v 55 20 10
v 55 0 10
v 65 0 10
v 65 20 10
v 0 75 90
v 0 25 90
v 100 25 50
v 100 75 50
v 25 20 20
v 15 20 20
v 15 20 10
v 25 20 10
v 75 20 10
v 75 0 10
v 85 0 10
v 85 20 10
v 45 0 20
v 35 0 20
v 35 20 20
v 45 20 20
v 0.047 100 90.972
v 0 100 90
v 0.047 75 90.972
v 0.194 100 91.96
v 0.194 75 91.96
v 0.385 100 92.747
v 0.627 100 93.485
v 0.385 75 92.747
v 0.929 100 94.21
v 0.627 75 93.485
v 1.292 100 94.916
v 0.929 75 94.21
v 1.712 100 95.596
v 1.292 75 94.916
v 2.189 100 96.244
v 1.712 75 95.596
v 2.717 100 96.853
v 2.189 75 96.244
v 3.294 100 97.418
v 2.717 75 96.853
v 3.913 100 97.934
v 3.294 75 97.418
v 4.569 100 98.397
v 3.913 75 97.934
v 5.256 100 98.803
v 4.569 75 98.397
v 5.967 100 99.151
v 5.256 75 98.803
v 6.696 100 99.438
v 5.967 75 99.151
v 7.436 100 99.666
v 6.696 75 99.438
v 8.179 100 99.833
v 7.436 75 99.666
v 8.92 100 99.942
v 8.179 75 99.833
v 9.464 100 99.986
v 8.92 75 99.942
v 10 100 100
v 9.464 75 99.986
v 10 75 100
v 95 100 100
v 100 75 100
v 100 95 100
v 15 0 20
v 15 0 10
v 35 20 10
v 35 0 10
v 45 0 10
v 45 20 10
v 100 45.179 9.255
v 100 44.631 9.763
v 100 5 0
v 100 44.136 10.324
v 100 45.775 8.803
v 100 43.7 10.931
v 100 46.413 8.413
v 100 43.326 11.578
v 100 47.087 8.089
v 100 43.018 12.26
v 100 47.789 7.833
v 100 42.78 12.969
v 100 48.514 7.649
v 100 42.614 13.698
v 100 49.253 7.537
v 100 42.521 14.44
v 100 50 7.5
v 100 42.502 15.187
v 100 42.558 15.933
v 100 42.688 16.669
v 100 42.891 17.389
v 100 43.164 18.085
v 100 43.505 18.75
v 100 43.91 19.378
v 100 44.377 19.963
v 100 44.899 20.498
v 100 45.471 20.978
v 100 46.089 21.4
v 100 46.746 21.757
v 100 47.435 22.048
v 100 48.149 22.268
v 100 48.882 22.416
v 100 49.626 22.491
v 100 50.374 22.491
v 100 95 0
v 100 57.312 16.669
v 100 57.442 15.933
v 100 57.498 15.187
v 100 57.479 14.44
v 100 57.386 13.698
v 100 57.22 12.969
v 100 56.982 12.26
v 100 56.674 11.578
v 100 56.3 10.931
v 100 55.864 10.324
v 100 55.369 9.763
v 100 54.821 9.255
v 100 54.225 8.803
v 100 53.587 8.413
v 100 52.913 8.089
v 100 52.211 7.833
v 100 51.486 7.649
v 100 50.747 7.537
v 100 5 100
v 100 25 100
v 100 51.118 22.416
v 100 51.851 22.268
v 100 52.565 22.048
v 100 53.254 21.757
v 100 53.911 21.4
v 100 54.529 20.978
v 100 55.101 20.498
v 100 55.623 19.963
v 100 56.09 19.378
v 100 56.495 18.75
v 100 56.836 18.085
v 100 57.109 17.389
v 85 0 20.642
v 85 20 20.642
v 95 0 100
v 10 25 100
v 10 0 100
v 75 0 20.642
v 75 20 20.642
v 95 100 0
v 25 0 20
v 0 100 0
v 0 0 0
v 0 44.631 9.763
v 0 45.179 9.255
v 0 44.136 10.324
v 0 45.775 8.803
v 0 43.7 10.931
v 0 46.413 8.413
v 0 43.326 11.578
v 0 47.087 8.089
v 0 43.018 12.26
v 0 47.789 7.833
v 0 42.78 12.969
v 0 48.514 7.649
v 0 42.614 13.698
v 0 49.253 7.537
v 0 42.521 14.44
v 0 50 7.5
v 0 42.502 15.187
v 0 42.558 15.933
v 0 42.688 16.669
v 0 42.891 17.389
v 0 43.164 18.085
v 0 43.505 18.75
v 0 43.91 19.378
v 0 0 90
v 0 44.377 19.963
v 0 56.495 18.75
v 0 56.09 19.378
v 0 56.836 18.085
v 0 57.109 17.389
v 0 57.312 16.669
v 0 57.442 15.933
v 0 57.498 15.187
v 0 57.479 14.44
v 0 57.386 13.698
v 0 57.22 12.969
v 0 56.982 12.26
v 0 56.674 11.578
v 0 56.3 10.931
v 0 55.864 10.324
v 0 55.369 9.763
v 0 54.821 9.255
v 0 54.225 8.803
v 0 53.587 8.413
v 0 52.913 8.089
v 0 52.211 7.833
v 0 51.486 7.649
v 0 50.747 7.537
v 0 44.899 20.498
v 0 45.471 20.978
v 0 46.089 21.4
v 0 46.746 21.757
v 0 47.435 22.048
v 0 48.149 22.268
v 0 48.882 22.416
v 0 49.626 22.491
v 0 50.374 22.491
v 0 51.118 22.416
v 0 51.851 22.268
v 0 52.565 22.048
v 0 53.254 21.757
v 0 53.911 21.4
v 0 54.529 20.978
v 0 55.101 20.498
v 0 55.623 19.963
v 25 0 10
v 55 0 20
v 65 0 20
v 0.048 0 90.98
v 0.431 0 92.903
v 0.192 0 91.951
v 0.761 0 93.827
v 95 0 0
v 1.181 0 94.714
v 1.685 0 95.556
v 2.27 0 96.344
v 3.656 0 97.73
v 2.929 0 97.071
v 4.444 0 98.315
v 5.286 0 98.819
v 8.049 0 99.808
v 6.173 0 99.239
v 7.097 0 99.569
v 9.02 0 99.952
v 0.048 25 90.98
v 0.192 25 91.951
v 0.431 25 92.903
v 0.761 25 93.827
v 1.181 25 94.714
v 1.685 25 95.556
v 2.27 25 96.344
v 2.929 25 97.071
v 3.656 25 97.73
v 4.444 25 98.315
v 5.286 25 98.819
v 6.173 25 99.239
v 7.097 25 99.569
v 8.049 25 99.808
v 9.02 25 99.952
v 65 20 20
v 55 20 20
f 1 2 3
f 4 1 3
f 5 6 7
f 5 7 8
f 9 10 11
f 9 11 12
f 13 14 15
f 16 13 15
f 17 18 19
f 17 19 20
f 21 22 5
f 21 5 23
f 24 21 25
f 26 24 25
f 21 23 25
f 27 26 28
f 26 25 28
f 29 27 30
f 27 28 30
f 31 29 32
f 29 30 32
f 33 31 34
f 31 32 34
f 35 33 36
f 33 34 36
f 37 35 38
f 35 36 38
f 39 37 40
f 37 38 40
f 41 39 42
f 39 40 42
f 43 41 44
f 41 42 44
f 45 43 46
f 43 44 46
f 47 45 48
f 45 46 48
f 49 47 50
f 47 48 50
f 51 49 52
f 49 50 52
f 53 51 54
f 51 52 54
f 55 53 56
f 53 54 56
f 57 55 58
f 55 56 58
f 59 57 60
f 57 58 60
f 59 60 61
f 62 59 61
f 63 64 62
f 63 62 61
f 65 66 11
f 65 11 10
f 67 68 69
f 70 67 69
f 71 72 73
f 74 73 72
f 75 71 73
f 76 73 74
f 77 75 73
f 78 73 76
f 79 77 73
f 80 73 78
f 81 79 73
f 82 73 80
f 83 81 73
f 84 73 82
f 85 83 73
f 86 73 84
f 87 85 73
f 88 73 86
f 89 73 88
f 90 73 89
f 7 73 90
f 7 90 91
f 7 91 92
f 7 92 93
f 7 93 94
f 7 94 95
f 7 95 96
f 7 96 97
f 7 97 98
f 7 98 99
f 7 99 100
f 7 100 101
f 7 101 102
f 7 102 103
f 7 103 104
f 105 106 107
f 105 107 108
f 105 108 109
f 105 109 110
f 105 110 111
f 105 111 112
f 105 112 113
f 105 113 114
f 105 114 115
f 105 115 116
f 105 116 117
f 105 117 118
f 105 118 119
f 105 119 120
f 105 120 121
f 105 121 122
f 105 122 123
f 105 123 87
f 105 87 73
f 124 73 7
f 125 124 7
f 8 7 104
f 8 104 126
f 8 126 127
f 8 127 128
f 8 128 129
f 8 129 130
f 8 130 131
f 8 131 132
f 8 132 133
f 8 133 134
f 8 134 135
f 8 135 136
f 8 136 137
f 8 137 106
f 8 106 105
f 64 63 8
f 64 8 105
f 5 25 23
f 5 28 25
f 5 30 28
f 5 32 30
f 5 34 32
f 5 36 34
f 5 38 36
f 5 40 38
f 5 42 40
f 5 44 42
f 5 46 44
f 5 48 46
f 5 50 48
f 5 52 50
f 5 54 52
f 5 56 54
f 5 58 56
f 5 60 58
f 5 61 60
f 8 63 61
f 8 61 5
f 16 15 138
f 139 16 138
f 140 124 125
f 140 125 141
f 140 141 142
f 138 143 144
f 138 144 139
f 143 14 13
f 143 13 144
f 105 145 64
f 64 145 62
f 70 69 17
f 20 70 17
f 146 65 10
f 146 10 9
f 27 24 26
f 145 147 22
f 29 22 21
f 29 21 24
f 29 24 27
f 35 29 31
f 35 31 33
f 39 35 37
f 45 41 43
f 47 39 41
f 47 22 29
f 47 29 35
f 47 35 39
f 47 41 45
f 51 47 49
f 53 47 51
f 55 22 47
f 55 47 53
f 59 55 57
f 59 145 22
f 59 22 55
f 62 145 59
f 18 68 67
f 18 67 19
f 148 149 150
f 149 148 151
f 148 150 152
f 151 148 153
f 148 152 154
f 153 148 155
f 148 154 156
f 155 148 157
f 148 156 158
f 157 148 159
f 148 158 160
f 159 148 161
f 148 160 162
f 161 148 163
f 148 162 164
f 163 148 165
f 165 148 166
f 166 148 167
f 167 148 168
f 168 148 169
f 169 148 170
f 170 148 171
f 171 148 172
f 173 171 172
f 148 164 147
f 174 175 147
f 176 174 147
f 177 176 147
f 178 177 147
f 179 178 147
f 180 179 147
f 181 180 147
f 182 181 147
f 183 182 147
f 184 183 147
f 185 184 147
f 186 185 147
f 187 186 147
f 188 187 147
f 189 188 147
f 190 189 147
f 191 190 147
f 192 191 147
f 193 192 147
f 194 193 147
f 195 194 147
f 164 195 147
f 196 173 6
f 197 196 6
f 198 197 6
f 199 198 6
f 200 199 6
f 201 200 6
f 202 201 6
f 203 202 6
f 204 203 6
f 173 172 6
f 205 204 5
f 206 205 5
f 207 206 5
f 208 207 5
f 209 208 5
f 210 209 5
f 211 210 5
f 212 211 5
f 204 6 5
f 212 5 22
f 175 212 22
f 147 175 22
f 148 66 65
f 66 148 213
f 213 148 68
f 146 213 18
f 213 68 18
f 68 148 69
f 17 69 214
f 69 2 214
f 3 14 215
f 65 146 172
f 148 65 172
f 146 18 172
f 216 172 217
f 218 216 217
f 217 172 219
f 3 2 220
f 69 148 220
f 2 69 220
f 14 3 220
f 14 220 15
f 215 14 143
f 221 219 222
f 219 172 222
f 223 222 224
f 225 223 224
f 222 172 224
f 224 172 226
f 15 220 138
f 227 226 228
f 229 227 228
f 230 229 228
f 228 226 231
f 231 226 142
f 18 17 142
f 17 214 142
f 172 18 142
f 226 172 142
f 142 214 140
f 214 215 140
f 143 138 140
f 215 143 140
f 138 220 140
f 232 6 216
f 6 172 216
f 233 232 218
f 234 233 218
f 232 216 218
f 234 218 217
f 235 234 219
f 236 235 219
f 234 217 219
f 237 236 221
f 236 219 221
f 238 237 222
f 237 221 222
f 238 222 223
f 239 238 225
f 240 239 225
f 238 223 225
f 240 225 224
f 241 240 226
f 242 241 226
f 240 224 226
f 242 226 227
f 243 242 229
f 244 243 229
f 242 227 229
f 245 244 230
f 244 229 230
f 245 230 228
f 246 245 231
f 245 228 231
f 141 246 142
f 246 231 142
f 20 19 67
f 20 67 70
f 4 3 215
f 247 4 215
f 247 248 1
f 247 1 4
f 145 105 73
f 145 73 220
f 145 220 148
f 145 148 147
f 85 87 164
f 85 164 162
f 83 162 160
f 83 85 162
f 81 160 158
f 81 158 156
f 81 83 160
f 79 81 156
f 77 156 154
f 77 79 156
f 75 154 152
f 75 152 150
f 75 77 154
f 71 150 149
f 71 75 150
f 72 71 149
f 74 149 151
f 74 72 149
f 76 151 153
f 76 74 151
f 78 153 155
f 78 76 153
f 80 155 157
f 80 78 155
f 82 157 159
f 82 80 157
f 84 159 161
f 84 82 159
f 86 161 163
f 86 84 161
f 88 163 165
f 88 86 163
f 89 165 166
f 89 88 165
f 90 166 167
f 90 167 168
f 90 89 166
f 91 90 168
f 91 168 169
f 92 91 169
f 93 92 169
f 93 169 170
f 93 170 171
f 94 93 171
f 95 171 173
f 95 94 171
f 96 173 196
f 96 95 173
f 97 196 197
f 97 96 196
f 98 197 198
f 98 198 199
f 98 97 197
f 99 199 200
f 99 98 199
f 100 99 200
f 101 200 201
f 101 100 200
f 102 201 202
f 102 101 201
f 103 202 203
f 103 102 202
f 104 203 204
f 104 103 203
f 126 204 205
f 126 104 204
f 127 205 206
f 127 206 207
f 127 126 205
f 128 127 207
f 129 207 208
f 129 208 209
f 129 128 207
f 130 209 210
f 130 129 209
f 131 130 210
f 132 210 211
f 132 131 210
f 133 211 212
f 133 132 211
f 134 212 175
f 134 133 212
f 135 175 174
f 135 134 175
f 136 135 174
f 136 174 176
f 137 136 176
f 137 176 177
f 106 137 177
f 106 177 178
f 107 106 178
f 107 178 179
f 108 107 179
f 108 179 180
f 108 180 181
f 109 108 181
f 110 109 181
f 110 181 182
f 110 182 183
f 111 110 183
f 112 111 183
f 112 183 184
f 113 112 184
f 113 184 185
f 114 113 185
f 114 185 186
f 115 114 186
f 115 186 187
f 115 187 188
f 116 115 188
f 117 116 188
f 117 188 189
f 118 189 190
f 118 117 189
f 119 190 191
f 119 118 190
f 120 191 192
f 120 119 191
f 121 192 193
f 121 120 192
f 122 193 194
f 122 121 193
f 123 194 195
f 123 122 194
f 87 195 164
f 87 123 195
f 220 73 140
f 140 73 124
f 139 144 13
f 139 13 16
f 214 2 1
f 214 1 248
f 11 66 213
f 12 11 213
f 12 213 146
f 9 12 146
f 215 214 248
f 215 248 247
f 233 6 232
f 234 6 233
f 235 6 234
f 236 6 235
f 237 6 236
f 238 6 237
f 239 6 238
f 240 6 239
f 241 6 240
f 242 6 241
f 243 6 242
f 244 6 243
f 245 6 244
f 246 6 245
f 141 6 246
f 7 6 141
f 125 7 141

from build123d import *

# Parameters (mm, degrees)
F0_W     = 5
F0_H     = 100
F0_W_2   = 50
F0_H_2   = 40
F1_DEPTH = 100
F2_W     = 10
F2_H     = 10
F2_H_2   = 10.6422880292
F3_DEPTH = 20
F4_R     = 10
F5_R     = 10
F6_SIZE  = 5
F7_SIZE  = 5
F8_SIZE2 = 39.99999
F8_SIZE  = 99.99999


# Not quite as in the source:
# - a fillet or chamfer is up to 0.001 mm smaller than in the source, because OpenCascade refuses the exact size


with BuildPart() as f1:
    # F0 (on Right) → F1 (new body)
    with BuildSketch(Plane.YZ):
        with Locations((2.5, 50)):
            Rectangle(F0_W, F0_H)
        Polygon((5, 100), (5, 0), (50, 0), (95, 0), (95, 100), (75, 100), (75, 90), (75, 50), (25, 50), (25, 90), (25, 100), align=None)
        with BuildLine():
            ThreePointArc((57.5, 15), (55.3033008589, 9.6966991411), (50, 7.5))
            ThreePointArc((50, 7.5), (44.6966991411, 20.3033008589), (57.5, 15))
        make_face(mode=Mode.SUBTRACT)
        with Locations((97.5, 50)):
            Rectangle(F0_W, F0_H)
        with Locations((50, 70)):
            Rectangle(F0_W_2, F0_H_2)
    extrude(amount=-F1_DEPTH)

    # F2 (on Front) → F3 (cut)
    with BuildSketch(Plane.XZ):
        with Locations((-80, 15)):
            Rectangle(F2_W, F2_H)
        with Locations((-60, 15)):
            Rectangle(F2_W, F2_H)
        with Locations((-40, 15)):
            Rectangle(F2_W, F2_H)
        with Locations((-20, 15.3211440146)):
            Rectangle(F2_W, F2_H_2)
    extrude(amount=-F3_DEPTH, mode=Mode.SUBTRACT)

    # F4
    f4_edges = [f1.edges().sort_by_distance(p)[0] for p in [
        (-100, 12.5, 100),
    ]]
    fillet(f4_edges, radius=F4_R)

    # F5
    f5_edges = [f1.edges().sort_by_distance(p)[0] for p in [
        (-100, 87.5, 100),
    ]]
    fillet(f5_edges, radius=F5_R)

    # F6
    f6_edges = [f1.edges().sort_by_distance(p)[0] for p in [
        (0, 0, 50),
    ]]
    chamfer(f6_edges, length=F6_SIZE)

    # F7
    f7_edges = [f1.edges().sort_by_distance(p)[0] for p in [
        (0, 100, 50),
    ]]
    chamfer(f7_edges, length=F7_SIZE)

    # F8 (size 100 and 40 in the source; OpenCascade refuses exactly that, so slightly less here)
    f8_edges = [f1.edges().sort_by_distance(p)[0] for p in [
        (0, 50, 90),
    ]]
    f8_side = f1.faces().sort_by_distance((-50, 50, 90))[0]
    chamfer(f8_edges, length=F8_SIZE, length2=F8_SIZE2, reference=f8_side)


with BuildPart() as f1_1:
    # F9: moved
    add(f1.part.moved(Location((100, 0, 0))))


solid = f1_1.part
